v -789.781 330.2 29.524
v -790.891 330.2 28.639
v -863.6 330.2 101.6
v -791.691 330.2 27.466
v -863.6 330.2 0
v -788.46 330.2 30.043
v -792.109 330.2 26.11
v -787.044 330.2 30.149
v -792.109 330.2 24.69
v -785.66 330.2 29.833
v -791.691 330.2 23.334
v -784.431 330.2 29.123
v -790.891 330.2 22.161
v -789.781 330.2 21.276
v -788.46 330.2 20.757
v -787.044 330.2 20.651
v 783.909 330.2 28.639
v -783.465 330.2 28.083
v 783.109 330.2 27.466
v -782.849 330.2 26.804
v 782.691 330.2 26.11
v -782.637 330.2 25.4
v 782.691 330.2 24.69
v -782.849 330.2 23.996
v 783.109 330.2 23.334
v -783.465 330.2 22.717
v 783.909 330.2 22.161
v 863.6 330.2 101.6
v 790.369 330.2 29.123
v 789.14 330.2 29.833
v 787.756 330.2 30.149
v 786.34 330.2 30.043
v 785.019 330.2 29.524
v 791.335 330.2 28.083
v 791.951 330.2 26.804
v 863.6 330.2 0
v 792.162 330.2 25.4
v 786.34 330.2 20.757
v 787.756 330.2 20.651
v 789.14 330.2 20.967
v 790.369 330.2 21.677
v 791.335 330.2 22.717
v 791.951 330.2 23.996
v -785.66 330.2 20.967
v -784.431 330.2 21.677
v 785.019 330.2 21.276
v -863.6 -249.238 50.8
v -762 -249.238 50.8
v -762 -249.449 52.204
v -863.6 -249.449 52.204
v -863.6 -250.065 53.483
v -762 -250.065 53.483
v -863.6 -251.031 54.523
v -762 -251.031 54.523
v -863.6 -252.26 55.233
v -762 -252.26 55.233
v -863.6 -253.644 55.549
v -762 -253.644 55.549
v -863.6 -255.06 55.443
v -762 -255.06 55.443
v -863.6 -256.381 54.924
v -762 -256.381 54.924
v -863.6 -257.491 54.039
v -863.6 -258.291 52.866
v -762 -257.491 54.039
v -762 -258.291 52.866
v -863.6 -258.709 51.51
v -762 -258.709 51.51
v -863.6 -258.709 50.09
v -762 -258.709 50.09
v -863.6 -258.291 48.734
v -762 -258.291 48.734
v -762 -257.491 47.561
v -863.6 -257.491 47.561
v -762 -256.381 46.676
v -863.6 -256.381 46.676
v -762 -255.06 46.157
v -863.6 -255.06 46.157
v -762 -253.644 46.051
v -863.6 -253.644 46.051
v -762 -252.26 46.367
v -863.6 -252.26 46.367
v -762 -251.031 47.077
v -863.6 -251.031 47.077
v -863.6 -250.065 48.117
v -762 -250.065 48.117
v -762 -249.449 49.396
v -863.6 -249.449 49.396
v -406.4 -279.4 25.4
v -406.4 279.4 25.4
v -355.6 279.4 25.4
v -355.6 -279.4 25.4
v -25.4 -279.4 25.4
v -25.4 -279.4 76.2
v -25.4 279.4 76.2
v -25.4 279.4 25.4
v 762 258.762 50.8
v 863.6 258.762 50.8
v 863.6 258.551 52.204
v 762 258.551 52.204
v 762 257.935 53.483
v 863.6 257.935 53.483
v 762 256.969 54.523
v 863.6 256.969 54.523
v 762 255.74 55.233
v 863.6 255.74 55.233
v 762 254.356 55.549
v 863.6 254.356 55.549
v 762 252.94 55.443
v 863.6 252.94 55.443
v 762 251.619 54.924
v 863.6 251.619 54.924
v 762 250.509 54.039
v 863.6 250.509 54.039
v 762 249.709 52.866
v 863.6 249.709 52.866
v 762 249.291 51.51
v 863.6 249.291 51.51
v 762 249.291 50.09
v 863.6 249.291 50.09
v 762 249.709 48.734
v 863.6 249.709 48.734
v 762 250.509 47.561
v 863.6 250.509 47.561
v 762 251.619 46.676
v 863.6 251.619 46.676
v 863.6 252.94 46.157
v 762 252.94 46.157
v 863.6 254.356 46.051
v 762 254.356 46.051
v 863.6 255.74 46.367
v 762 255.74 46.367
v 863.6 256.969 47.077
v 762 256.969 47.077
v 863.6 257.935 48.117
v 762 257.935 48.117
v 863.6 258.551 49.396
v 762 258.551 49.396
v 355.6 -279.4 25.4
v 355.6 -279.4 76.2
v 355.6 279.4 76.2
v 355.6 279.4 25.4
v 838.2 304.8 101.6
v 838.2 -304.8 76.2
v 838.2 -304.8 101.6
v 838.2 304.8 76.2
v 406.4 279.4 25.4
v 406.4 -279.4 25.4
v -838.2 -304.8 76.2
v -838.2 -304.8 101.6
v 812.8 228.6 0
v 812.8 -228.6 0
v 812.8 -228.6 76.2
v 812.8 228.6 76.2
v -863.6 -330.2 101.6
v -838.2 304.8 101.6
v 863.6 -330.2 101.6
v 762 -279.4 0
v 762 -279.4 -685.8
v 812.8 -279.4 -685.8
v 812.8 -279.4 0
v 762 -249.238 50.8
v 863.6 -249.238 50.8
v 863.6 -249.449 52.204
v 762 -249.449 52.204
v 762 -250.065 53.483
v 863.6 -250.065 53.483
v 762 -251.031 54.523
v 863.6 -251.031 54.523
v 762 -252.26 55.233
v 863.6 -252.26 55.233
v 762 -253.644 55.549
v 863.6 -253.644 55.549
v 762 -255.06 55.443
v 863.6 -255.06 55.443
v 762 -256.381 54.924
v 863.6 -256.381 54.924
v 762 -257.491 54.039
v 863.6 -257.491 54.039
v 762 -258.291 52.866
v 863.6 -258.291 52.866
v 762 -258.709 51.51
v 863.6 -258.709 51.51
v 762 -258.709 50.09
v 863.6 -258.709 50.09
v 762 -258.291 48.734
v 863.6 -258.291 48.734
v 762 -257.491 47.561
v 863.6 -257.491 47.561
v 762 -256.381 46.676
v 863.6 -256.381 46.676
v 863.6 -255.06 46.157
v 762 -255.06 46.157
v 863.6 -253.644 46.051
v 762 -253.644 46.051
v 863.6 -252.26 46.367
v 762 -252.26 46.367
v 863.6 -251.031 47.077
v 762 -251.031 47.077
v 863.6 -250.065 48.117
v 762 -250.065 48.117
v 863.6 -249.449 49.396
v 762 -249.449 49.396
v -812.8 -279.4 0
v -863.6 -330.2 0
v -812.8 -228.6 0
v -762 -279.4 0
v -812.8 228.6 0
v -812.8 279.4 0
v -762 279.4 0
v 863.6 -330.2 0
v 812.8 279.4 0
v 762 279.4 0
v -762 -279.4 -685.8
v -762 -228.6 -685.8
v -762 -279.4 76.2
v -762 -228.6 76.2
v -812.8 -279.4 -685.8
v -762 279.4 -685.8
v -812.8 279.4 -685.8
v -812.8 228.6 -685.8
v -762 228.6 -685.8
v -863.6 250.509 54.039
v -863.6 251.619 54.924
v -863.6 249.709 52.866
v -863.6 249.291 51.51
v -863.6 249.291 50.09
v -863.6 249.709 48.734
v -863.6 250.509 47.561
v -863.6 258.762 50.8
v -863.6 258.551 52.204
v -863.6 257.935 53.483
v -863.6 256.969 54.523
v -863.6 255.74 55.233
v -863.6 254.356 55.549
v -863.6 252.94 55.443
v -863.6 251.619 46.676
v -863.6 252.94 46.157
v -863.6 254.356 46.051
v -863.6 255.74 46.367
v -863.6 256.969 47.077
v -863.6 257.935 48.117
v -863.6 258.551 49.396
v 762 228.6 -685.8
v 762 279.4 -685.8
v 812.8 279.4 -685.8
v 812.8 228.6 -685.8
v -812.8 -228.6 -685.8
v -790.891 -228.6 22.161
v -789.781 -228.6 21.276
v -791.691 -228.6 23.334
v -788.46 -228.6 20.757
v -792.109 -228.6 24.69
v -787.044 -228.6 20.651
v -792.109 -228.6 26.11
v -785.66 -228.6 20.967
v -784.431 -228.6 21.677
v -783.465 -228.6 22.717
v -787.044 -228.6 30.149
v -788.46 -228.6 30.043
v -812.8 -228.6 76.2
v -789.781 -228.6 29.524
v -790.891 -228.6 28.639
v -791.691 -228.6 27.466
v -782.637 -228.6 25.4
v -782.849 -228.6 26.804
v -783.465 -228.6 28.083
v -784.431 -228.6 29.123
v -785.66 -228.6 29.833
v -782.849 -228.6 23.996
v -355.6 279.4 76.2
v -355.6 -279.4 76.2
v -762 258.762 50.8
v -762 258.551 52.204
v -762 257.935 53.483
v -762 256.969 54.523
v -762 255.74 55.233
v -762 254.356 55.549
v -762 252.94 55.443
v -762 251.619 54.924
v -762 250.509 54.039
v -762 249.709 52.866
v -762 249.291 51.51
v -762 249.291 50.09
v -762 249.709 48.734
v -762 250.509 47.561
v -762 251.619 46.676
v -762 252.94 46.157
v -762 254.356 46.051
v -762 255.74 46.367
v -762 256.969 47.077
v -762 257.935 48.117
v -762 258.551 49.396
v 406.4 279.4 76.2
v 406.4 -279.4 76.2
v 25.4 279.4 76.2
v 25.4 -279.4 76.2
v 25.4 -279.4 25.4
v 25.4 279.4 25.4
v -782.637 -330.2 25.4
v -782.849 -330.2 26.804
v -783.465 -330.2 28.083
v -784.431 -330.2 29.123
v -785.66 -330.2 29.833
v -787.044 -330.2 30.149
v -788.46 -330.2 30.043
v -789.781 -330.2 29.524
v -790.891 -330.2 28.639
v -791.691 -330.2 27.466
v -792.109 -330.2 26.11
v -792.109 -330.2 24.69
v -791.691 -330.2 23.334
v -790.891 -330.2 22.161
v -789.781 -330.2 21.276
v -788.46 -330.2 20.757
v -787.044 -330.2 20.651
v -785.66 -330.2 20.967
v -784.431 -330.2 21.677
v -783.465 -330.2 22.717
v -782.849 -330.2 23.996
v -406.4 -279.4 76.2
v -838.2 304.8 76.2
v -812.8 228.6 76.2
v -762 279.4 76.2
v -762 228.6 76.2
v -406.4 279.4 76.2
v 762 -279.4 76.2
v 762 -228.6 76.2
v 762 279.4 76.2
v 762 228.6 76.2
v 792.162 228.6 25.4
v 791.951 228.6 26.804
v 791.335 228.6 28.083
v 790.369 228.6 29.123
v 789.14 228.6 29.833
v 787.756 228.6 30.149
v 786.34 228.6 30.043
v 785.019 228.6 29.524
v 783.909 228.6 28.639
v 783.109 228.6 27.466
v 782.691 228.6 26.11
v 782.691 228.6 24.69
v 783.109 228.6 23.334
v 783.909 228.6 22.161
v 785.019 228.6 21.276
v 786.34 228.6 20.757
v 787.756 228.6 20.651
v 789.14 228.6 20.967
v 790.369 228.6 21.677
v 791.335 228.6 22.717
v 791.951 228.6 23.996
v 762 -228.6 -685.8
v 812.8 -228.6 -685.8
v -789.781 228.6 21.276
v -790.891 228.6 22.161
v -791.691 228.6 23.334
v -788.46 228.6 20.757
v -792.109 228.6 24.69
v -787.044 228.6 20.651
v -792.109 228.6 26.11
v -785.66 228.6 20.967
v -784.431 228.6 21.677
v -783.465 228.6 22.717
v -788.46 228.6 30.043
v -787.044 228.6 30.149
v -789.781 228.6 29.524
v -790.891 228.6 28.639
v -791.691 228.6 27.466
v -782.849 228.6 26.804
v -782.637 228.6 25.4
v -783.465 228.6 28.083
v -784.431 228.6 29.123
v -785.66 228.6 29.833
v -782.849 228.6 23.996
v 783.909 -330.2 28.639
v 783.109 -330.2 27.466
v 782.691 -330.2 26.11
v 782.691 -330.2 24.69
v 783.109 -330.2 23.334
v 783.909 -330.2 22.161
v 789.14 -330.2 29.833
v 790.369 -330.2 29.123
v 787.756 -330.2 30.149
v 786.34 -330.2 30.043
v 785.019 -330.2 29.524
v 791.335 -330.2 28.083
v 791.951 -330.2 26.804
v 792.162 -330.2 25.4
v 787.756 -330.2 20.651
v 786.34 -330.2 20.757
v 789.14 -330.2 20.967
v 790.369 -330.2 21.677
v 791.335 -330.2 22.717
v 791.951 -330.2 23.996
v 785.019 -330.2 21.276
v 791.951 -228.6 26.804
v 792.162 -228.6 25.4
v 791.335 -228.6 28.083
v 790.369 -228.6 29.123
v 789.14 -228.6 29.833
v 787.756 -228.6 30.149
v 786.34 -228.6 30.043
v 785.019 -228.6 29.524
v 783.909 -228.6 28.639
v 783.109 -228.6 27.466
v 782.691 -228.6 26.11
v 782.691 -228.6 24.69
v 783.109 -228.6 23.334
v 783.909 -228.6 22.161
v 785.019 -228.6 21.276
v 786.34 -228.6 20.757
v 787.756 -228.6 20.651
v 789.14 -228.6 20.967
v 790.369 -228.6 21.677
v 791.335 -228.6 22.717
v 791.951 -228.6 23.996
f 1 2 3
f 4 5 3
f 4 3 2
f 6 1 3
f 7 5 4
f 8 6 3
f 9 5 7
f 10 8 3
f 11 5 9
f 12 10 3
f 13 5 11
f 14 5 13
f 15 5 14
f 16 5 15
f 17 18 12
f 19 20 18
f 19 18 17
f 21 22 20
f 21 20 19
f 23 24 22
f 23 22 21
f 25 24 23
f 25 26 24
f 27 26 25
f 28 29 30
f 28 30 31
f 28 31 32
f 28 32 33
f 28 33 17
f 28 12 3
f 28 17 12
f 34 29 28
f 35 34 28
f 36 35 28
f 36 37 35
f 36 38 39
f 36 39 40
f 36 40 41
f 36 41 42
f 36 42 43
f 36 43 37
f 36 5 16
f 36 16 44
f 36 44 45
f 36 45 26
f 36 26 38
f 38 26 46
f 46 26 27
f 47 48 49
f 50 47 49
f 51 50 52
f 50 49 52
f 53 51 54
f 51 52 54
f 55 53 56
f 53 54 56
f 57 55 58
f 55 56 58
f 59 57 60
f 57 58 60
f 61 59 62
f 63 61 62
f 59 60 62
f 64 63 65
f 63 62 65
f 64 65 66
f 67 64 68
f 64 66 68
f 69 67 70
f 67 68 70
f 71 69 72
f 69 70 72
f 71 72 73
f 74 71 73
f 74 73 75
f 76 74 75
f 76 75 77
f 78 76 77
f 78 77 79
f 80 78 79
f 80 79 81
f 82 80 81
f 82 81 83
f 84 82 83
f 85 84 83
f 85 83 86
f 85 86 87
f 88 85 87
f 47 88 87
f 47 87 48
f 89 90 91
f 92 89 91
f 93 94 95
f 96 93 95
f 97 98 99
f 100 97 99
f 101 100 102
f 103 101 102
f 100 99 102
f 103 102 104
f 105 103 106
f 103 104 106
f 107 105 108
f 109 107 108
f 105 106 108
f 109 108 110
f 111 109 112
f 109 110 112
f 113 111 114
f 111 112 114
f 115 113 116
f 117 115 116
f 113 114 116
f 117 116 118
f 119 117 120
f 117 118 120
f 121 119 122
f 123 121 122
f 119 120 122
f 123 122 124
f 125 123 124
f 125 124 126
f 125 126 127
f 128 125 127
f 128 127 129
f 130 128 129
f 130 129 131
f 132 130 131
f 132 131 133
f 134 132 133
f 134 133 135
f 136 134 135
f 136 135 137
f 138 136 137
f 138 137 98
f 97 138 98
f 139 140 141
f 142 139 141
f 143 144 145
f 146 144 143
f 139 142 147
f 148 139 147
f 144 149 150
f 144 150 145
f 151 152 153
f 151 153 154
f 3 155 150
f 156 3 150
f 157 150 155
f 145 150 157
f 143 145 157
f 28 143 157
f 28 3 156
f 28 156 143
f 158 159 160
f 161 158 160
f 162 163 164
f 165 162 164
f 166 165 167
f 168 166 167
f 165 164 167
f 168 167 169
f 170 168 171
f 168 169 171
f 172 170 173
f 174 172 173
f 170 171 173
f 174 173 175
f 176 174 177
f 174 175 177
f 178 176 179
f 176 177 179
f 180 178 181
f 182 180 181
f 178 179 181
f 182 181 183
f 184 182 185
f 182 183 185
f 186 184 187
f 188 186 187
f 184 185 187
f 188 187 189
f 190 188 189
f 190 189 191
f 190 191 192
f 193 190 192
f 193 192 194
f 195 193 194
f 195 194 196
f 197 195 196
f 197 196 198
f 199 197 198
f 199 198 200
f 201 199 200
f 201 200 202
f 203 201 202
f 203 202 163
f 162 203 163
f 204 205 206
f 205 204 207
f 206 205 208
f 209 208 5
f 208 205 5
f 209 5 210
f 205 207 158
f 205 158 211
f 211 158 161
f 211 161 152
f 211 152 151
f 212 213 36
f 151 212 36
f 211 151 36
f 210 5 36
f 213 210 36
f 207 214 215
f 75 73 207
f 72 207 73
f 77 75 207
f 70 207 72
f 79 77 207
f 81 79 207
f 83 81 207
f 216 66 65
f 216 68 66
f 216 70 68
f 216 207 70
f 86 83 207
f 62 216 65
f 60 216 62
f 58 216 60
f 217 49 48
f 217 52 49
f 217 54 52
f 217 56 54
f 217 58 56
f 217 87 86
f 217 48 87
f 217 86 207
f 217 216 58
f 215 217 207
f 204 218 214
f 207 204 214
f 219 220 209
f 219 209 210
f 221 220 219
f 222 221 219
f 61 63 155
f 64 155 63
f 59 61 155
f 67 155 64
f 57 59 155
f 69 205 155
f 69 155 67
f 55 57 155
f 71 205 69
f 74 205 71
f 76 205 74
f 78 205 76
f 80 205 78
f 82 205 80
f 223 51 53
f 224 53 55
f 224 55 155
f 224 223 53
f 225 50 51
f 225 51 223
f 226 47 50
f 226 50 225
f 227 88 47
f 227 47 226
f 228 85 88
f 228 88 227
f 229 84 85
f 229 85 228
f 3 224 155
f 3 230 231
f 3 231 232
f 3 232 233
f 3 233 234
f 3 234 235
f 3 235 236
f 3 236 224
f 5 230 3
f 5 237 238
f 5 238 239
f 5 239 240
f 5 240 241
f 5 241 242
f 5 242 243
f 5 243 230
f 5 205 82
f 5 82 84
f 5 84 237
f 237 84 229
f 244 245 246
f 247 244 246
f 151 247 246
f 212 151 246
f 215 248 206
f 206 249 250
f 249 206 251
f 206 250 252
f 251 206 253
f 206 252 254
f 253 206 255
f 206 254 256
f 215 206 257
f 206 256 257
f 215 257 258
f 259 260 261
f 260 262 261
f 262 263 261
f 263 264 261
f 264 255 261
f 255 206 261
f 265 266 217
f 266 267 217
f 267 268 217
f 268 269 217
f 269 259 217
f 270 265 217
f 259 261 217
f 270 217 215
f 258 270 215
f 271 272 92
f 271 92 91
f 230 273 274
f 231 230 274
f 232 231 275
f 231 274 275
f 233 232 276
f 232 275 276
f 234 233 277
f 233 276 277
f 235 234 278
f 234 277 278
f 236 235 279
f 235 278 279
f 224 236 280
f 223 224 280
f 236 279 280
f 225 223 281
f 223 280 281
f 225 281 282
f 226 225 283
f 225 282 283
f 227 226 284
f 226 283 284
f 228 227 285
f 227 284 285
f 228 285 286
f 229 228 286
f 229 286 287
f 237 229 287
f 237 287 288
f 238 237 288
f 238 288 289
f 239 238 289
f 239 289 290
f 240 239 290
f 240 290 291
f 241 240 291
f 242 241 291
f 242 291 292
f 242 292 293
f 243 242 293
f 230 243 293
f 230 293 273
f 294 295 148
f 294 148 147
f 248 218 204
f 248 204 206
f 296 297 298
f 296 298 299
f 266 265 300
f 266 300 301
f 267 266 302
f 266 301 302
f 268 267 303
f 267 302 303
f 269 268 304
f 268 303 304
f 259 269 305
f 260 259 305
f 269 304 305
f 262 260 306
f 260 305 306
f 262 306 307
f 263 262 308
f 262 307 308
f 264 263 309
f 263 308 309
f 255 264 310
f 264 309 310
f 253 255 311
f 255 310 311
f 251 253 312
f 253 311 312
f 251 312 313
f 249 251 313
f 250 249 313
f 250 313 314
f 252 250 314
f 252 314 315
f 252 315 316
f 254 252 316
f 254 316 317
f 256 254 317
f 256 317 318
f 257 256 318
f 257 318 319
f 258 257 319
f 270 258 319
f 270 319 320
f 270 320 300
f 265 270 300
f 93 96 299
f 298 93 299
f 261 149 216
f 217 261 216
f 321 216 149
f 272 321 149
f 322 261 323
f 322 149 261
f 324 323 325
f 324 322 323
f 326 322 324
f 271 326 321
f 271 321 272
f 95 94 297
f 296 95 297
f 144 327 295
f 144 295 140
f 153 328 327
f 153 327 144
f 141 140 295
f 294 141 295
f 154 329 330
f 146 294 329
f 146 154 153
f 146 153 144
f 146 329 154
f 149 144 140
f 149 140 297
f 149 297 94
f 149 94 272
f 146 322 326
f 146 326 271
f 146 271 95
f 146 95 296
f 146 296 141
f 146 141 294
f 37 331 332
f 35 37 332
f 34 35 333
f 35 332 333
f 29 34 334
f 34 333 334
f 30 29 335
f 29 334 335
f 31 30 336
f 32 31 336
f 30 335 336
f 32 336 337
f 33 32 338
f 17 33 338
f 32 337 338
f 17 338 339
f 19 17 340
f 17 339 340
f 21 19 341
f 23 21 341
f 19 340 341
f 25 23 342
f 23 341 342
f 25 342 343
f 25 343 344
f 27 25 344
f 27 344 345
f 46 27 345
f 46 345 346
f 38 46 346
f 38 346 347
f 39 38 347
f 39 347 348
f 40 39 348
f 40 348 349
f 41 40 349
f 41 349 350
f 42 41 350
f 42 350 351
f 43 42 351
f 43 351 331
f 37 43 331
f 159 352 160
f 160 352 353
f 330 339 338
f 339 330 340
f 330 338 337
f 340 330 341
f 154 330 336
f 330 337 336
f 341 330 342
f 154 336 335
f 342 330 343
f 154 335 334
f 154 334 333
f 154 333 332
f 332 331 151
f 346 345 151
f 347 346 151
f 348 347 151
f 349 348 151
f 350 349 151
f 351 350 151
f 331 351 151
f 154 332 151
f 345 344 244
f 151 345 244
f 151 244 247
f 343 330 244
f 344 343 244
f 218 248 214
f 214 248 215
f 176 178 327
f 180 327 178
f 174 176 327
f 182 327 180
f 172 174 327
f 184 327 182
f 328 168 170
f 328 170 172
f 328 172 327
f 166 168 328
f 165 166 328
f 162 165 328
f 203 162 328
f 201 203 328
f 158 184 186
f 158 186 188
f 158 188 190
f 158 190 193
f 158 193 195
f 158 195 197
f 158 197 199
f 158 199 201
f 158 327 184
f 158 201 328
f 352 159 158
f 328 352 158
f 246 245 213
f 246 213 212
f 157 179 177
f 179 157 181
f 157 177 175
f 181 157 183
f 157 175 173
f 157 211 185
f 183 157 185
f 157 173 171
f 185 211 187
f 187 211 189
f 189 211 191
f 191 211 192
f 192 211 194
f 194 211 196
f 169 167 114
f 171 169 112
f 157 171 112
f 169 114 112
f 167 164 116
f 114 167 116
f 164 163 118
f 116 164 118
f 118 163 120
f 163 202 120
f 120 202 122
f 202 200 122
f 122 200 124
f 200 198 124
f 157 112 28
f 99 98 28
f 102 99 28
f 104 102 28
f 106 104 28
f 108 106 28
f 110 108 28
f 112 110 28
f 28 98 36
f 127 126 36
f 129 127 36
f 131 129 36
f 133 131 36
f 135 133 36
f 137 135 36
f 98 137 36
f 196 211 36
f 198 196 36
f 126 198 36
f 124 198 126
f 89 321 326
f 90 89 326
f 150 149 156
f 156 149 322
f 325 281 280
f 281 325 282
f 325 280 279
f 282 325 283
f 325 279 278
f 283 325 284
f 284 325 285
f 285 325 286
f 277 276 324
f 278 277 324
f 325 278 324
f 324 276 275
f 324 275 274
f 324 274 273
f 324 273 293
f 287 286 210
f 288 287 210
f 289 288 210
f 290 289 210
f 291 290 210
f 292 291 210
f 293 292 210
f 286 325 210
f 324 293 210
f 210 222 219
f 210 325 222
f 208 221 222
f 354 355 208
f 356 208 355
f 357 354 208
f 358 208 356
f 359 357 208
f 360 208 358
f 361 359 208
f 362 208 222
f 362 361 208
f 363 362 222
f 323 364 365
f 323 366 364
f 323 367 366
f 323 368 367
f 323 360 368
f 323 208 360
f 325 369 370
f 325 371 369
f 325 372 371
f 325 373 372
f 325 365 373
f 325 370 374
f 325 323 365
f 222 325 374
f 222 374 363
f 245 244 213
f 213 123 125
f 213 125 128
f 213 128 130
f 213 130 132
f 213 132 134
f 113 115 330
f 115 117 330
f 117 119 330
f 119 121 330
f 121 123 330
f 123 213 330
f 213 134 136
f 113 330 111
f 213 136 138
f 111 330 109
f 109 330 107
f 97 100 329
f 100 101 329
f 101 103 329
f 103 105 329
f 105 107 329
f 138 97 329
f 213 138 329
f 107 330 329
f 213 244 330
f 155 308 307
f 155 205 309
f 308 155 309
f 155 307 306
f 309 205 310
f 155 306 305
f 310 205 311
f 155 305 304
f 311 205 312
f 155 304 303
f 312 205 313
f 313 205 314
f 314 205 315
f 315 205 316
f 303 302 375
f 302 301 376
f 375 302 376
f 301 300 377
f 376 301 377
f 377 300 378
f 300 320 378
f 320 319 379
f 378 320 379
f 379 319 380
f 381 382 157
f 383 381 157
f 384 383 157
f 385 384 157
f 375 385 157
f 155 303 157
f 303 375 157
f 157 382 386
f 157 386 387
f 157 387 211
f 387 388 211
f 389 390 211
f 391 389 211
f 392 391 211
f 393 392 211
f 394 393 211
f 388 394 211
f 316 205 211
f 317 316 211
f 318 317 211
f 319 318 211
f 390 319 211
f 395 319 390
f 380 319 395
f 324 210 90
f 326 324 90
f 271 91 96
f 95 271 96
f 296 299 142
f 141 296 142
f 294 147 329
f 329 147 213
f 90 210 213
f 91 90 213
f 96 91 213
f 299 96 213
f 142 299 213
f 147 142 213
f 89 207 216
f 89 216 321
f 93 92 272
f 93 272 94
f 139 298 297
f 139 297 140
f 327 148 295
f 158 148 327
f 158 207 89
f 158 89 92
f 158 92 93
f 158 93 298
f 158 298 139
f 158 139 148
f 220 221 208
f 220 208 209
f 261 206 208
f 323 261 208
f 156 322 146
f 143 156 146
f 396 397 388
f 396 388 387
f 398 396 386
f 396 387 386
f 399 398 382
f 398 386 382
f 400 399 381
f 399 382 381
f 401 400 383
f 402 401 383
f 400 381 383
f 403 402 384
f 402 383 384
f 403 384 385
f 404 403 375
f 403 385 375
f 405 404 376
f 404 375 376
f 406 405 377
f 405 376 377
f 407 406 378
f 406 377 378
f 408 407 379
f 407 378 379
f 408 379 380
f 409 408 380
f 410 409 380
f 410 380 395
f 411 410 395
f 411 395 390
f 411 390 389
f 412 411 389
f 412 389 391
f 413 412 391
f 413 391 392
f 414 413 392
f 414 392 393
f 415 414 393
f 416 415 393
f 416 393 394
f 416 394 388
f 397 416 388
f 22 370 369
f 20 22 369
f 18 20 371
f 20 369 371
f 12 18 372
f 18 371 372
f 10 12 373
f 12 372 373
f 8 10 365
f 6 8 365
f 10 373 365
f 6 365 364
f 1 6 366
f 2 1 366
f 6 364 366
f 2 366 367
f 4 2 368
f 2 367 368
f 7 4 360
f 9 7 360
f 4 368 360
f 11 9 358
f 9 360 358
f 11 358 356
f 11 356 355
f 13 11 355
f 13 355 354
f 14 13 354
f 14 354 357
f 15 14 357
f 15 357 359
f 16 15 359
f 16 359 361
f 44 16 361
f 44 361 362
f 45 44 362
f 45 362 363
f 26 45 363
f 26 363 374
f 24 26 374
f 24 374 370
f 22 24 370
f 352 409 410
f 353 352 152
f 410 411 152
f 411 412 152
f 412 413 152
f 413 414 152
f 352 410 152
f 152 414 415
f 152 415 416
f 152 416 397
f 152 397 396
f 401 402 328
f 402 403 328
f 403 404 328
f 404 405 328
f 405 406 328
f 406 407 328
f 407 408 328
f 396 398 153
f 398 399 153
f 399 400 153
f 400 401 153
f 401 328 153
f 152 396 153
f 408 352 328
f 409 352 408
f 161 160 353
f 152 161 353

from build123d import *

# Parameters (mm, degrees)
F0_W          = 1727.2
F0_H          = 660.4
F0_W_2        = 1676.4
F0_H_2        = 609.6
F1_DEPTH      = 101.6
F2_W          = 1676.4
F2_H          = 609.6
F2_W_2        = 1625.6
F2_H_2        = 558.8
F3_DEPTH      = 76.2
F4_W          = 50.8
F4_H          = 50.8
F5_DEPTH      = 76.2
F5_DEPTH_BACK = 685.8
F6_R          = 4.7625
F7_DEPTH      = 1727.201
F8_R          = 4.7625
F9_DEPTH      = 660.401
F10_W         = 50.8
F10_H         = 558.8
F11_DEPTH     = 50.8


with BuildPart() as f1:
    # F0 (on Top) → F1 (new body)
    with BuildSketch(Plane.XY):
        Rectangle(F0_W, F0_H)
        Rectangle(F0_W_2, F0_H_2, mode=Mode.SUBTRACT)
    extrude(amount=F1_DEPTH)

    # F2 (on Top) → F3 (join)
    with BuildSketch(Plane.XY):
        Rectangle(F2_W, F2_H)
        Rectangle(F2_W_2, F2_H_2, mode=Mode.SUBTRACT)
    extrude(amount=F3_DEPTH)

    # F4 (on Top) → F5 (join, two sides)
    with BuildSketch(Plane.XY) as f5_sk:
        with Locations((-787.4, -254)):
            Rectangle(F4_W, F4_H)
        with Locations((-787.4, 254)):
            Rectangle(F4_W, F4_H)
        with Locations((787.4, -254)):
            Rectangle(F4_W, F4_H)
        with Locations((787.4, 254)):
            Rectangle(F4_W, F4_H)
    extrude(amount=F5_DEPTH)
    extrude(f5_sk.sketch, amount=-F5_DEPTH_BACK)

    # F6 (on face) → F7 (cut, through all)
    with BuildSketch(Plane.YZ.offset(863.6)):
        with Locations((-254, 50.8)):
            Circle(F6_R)
        with Locations((254, 50.8)):
            Circle(F6_R)
    extrude(amount=-F7_DEPTH, mode=Mode.SUBTRACT)

    # F8 (on face) → F9 (cut, through all)
    with BuildSketch(Plane.XZ.offset(330.2)):
        with Locations((-787.4, 25.4)):
            Circle(F8_R)
        with Locations((787.4, 25.4)):
            Circle(F8_R)
    extrude(amount=-F9_DEPTH, mode=Mode.SUBTRACT)

    # F10 (on face) → F11 (join)
    with BuildSketch(Plane.XY.offset(76.2)):
        with Locations((-381, 0)):
            Rectangle(F10_W, F10_H)
        with Locations((381, 0)):
            Rectangle(F10_W, F10_H)
        Rectangle(F10_W, F10_H)
    extrude(amount=-F11_DEPTH)


solid = f1.part
